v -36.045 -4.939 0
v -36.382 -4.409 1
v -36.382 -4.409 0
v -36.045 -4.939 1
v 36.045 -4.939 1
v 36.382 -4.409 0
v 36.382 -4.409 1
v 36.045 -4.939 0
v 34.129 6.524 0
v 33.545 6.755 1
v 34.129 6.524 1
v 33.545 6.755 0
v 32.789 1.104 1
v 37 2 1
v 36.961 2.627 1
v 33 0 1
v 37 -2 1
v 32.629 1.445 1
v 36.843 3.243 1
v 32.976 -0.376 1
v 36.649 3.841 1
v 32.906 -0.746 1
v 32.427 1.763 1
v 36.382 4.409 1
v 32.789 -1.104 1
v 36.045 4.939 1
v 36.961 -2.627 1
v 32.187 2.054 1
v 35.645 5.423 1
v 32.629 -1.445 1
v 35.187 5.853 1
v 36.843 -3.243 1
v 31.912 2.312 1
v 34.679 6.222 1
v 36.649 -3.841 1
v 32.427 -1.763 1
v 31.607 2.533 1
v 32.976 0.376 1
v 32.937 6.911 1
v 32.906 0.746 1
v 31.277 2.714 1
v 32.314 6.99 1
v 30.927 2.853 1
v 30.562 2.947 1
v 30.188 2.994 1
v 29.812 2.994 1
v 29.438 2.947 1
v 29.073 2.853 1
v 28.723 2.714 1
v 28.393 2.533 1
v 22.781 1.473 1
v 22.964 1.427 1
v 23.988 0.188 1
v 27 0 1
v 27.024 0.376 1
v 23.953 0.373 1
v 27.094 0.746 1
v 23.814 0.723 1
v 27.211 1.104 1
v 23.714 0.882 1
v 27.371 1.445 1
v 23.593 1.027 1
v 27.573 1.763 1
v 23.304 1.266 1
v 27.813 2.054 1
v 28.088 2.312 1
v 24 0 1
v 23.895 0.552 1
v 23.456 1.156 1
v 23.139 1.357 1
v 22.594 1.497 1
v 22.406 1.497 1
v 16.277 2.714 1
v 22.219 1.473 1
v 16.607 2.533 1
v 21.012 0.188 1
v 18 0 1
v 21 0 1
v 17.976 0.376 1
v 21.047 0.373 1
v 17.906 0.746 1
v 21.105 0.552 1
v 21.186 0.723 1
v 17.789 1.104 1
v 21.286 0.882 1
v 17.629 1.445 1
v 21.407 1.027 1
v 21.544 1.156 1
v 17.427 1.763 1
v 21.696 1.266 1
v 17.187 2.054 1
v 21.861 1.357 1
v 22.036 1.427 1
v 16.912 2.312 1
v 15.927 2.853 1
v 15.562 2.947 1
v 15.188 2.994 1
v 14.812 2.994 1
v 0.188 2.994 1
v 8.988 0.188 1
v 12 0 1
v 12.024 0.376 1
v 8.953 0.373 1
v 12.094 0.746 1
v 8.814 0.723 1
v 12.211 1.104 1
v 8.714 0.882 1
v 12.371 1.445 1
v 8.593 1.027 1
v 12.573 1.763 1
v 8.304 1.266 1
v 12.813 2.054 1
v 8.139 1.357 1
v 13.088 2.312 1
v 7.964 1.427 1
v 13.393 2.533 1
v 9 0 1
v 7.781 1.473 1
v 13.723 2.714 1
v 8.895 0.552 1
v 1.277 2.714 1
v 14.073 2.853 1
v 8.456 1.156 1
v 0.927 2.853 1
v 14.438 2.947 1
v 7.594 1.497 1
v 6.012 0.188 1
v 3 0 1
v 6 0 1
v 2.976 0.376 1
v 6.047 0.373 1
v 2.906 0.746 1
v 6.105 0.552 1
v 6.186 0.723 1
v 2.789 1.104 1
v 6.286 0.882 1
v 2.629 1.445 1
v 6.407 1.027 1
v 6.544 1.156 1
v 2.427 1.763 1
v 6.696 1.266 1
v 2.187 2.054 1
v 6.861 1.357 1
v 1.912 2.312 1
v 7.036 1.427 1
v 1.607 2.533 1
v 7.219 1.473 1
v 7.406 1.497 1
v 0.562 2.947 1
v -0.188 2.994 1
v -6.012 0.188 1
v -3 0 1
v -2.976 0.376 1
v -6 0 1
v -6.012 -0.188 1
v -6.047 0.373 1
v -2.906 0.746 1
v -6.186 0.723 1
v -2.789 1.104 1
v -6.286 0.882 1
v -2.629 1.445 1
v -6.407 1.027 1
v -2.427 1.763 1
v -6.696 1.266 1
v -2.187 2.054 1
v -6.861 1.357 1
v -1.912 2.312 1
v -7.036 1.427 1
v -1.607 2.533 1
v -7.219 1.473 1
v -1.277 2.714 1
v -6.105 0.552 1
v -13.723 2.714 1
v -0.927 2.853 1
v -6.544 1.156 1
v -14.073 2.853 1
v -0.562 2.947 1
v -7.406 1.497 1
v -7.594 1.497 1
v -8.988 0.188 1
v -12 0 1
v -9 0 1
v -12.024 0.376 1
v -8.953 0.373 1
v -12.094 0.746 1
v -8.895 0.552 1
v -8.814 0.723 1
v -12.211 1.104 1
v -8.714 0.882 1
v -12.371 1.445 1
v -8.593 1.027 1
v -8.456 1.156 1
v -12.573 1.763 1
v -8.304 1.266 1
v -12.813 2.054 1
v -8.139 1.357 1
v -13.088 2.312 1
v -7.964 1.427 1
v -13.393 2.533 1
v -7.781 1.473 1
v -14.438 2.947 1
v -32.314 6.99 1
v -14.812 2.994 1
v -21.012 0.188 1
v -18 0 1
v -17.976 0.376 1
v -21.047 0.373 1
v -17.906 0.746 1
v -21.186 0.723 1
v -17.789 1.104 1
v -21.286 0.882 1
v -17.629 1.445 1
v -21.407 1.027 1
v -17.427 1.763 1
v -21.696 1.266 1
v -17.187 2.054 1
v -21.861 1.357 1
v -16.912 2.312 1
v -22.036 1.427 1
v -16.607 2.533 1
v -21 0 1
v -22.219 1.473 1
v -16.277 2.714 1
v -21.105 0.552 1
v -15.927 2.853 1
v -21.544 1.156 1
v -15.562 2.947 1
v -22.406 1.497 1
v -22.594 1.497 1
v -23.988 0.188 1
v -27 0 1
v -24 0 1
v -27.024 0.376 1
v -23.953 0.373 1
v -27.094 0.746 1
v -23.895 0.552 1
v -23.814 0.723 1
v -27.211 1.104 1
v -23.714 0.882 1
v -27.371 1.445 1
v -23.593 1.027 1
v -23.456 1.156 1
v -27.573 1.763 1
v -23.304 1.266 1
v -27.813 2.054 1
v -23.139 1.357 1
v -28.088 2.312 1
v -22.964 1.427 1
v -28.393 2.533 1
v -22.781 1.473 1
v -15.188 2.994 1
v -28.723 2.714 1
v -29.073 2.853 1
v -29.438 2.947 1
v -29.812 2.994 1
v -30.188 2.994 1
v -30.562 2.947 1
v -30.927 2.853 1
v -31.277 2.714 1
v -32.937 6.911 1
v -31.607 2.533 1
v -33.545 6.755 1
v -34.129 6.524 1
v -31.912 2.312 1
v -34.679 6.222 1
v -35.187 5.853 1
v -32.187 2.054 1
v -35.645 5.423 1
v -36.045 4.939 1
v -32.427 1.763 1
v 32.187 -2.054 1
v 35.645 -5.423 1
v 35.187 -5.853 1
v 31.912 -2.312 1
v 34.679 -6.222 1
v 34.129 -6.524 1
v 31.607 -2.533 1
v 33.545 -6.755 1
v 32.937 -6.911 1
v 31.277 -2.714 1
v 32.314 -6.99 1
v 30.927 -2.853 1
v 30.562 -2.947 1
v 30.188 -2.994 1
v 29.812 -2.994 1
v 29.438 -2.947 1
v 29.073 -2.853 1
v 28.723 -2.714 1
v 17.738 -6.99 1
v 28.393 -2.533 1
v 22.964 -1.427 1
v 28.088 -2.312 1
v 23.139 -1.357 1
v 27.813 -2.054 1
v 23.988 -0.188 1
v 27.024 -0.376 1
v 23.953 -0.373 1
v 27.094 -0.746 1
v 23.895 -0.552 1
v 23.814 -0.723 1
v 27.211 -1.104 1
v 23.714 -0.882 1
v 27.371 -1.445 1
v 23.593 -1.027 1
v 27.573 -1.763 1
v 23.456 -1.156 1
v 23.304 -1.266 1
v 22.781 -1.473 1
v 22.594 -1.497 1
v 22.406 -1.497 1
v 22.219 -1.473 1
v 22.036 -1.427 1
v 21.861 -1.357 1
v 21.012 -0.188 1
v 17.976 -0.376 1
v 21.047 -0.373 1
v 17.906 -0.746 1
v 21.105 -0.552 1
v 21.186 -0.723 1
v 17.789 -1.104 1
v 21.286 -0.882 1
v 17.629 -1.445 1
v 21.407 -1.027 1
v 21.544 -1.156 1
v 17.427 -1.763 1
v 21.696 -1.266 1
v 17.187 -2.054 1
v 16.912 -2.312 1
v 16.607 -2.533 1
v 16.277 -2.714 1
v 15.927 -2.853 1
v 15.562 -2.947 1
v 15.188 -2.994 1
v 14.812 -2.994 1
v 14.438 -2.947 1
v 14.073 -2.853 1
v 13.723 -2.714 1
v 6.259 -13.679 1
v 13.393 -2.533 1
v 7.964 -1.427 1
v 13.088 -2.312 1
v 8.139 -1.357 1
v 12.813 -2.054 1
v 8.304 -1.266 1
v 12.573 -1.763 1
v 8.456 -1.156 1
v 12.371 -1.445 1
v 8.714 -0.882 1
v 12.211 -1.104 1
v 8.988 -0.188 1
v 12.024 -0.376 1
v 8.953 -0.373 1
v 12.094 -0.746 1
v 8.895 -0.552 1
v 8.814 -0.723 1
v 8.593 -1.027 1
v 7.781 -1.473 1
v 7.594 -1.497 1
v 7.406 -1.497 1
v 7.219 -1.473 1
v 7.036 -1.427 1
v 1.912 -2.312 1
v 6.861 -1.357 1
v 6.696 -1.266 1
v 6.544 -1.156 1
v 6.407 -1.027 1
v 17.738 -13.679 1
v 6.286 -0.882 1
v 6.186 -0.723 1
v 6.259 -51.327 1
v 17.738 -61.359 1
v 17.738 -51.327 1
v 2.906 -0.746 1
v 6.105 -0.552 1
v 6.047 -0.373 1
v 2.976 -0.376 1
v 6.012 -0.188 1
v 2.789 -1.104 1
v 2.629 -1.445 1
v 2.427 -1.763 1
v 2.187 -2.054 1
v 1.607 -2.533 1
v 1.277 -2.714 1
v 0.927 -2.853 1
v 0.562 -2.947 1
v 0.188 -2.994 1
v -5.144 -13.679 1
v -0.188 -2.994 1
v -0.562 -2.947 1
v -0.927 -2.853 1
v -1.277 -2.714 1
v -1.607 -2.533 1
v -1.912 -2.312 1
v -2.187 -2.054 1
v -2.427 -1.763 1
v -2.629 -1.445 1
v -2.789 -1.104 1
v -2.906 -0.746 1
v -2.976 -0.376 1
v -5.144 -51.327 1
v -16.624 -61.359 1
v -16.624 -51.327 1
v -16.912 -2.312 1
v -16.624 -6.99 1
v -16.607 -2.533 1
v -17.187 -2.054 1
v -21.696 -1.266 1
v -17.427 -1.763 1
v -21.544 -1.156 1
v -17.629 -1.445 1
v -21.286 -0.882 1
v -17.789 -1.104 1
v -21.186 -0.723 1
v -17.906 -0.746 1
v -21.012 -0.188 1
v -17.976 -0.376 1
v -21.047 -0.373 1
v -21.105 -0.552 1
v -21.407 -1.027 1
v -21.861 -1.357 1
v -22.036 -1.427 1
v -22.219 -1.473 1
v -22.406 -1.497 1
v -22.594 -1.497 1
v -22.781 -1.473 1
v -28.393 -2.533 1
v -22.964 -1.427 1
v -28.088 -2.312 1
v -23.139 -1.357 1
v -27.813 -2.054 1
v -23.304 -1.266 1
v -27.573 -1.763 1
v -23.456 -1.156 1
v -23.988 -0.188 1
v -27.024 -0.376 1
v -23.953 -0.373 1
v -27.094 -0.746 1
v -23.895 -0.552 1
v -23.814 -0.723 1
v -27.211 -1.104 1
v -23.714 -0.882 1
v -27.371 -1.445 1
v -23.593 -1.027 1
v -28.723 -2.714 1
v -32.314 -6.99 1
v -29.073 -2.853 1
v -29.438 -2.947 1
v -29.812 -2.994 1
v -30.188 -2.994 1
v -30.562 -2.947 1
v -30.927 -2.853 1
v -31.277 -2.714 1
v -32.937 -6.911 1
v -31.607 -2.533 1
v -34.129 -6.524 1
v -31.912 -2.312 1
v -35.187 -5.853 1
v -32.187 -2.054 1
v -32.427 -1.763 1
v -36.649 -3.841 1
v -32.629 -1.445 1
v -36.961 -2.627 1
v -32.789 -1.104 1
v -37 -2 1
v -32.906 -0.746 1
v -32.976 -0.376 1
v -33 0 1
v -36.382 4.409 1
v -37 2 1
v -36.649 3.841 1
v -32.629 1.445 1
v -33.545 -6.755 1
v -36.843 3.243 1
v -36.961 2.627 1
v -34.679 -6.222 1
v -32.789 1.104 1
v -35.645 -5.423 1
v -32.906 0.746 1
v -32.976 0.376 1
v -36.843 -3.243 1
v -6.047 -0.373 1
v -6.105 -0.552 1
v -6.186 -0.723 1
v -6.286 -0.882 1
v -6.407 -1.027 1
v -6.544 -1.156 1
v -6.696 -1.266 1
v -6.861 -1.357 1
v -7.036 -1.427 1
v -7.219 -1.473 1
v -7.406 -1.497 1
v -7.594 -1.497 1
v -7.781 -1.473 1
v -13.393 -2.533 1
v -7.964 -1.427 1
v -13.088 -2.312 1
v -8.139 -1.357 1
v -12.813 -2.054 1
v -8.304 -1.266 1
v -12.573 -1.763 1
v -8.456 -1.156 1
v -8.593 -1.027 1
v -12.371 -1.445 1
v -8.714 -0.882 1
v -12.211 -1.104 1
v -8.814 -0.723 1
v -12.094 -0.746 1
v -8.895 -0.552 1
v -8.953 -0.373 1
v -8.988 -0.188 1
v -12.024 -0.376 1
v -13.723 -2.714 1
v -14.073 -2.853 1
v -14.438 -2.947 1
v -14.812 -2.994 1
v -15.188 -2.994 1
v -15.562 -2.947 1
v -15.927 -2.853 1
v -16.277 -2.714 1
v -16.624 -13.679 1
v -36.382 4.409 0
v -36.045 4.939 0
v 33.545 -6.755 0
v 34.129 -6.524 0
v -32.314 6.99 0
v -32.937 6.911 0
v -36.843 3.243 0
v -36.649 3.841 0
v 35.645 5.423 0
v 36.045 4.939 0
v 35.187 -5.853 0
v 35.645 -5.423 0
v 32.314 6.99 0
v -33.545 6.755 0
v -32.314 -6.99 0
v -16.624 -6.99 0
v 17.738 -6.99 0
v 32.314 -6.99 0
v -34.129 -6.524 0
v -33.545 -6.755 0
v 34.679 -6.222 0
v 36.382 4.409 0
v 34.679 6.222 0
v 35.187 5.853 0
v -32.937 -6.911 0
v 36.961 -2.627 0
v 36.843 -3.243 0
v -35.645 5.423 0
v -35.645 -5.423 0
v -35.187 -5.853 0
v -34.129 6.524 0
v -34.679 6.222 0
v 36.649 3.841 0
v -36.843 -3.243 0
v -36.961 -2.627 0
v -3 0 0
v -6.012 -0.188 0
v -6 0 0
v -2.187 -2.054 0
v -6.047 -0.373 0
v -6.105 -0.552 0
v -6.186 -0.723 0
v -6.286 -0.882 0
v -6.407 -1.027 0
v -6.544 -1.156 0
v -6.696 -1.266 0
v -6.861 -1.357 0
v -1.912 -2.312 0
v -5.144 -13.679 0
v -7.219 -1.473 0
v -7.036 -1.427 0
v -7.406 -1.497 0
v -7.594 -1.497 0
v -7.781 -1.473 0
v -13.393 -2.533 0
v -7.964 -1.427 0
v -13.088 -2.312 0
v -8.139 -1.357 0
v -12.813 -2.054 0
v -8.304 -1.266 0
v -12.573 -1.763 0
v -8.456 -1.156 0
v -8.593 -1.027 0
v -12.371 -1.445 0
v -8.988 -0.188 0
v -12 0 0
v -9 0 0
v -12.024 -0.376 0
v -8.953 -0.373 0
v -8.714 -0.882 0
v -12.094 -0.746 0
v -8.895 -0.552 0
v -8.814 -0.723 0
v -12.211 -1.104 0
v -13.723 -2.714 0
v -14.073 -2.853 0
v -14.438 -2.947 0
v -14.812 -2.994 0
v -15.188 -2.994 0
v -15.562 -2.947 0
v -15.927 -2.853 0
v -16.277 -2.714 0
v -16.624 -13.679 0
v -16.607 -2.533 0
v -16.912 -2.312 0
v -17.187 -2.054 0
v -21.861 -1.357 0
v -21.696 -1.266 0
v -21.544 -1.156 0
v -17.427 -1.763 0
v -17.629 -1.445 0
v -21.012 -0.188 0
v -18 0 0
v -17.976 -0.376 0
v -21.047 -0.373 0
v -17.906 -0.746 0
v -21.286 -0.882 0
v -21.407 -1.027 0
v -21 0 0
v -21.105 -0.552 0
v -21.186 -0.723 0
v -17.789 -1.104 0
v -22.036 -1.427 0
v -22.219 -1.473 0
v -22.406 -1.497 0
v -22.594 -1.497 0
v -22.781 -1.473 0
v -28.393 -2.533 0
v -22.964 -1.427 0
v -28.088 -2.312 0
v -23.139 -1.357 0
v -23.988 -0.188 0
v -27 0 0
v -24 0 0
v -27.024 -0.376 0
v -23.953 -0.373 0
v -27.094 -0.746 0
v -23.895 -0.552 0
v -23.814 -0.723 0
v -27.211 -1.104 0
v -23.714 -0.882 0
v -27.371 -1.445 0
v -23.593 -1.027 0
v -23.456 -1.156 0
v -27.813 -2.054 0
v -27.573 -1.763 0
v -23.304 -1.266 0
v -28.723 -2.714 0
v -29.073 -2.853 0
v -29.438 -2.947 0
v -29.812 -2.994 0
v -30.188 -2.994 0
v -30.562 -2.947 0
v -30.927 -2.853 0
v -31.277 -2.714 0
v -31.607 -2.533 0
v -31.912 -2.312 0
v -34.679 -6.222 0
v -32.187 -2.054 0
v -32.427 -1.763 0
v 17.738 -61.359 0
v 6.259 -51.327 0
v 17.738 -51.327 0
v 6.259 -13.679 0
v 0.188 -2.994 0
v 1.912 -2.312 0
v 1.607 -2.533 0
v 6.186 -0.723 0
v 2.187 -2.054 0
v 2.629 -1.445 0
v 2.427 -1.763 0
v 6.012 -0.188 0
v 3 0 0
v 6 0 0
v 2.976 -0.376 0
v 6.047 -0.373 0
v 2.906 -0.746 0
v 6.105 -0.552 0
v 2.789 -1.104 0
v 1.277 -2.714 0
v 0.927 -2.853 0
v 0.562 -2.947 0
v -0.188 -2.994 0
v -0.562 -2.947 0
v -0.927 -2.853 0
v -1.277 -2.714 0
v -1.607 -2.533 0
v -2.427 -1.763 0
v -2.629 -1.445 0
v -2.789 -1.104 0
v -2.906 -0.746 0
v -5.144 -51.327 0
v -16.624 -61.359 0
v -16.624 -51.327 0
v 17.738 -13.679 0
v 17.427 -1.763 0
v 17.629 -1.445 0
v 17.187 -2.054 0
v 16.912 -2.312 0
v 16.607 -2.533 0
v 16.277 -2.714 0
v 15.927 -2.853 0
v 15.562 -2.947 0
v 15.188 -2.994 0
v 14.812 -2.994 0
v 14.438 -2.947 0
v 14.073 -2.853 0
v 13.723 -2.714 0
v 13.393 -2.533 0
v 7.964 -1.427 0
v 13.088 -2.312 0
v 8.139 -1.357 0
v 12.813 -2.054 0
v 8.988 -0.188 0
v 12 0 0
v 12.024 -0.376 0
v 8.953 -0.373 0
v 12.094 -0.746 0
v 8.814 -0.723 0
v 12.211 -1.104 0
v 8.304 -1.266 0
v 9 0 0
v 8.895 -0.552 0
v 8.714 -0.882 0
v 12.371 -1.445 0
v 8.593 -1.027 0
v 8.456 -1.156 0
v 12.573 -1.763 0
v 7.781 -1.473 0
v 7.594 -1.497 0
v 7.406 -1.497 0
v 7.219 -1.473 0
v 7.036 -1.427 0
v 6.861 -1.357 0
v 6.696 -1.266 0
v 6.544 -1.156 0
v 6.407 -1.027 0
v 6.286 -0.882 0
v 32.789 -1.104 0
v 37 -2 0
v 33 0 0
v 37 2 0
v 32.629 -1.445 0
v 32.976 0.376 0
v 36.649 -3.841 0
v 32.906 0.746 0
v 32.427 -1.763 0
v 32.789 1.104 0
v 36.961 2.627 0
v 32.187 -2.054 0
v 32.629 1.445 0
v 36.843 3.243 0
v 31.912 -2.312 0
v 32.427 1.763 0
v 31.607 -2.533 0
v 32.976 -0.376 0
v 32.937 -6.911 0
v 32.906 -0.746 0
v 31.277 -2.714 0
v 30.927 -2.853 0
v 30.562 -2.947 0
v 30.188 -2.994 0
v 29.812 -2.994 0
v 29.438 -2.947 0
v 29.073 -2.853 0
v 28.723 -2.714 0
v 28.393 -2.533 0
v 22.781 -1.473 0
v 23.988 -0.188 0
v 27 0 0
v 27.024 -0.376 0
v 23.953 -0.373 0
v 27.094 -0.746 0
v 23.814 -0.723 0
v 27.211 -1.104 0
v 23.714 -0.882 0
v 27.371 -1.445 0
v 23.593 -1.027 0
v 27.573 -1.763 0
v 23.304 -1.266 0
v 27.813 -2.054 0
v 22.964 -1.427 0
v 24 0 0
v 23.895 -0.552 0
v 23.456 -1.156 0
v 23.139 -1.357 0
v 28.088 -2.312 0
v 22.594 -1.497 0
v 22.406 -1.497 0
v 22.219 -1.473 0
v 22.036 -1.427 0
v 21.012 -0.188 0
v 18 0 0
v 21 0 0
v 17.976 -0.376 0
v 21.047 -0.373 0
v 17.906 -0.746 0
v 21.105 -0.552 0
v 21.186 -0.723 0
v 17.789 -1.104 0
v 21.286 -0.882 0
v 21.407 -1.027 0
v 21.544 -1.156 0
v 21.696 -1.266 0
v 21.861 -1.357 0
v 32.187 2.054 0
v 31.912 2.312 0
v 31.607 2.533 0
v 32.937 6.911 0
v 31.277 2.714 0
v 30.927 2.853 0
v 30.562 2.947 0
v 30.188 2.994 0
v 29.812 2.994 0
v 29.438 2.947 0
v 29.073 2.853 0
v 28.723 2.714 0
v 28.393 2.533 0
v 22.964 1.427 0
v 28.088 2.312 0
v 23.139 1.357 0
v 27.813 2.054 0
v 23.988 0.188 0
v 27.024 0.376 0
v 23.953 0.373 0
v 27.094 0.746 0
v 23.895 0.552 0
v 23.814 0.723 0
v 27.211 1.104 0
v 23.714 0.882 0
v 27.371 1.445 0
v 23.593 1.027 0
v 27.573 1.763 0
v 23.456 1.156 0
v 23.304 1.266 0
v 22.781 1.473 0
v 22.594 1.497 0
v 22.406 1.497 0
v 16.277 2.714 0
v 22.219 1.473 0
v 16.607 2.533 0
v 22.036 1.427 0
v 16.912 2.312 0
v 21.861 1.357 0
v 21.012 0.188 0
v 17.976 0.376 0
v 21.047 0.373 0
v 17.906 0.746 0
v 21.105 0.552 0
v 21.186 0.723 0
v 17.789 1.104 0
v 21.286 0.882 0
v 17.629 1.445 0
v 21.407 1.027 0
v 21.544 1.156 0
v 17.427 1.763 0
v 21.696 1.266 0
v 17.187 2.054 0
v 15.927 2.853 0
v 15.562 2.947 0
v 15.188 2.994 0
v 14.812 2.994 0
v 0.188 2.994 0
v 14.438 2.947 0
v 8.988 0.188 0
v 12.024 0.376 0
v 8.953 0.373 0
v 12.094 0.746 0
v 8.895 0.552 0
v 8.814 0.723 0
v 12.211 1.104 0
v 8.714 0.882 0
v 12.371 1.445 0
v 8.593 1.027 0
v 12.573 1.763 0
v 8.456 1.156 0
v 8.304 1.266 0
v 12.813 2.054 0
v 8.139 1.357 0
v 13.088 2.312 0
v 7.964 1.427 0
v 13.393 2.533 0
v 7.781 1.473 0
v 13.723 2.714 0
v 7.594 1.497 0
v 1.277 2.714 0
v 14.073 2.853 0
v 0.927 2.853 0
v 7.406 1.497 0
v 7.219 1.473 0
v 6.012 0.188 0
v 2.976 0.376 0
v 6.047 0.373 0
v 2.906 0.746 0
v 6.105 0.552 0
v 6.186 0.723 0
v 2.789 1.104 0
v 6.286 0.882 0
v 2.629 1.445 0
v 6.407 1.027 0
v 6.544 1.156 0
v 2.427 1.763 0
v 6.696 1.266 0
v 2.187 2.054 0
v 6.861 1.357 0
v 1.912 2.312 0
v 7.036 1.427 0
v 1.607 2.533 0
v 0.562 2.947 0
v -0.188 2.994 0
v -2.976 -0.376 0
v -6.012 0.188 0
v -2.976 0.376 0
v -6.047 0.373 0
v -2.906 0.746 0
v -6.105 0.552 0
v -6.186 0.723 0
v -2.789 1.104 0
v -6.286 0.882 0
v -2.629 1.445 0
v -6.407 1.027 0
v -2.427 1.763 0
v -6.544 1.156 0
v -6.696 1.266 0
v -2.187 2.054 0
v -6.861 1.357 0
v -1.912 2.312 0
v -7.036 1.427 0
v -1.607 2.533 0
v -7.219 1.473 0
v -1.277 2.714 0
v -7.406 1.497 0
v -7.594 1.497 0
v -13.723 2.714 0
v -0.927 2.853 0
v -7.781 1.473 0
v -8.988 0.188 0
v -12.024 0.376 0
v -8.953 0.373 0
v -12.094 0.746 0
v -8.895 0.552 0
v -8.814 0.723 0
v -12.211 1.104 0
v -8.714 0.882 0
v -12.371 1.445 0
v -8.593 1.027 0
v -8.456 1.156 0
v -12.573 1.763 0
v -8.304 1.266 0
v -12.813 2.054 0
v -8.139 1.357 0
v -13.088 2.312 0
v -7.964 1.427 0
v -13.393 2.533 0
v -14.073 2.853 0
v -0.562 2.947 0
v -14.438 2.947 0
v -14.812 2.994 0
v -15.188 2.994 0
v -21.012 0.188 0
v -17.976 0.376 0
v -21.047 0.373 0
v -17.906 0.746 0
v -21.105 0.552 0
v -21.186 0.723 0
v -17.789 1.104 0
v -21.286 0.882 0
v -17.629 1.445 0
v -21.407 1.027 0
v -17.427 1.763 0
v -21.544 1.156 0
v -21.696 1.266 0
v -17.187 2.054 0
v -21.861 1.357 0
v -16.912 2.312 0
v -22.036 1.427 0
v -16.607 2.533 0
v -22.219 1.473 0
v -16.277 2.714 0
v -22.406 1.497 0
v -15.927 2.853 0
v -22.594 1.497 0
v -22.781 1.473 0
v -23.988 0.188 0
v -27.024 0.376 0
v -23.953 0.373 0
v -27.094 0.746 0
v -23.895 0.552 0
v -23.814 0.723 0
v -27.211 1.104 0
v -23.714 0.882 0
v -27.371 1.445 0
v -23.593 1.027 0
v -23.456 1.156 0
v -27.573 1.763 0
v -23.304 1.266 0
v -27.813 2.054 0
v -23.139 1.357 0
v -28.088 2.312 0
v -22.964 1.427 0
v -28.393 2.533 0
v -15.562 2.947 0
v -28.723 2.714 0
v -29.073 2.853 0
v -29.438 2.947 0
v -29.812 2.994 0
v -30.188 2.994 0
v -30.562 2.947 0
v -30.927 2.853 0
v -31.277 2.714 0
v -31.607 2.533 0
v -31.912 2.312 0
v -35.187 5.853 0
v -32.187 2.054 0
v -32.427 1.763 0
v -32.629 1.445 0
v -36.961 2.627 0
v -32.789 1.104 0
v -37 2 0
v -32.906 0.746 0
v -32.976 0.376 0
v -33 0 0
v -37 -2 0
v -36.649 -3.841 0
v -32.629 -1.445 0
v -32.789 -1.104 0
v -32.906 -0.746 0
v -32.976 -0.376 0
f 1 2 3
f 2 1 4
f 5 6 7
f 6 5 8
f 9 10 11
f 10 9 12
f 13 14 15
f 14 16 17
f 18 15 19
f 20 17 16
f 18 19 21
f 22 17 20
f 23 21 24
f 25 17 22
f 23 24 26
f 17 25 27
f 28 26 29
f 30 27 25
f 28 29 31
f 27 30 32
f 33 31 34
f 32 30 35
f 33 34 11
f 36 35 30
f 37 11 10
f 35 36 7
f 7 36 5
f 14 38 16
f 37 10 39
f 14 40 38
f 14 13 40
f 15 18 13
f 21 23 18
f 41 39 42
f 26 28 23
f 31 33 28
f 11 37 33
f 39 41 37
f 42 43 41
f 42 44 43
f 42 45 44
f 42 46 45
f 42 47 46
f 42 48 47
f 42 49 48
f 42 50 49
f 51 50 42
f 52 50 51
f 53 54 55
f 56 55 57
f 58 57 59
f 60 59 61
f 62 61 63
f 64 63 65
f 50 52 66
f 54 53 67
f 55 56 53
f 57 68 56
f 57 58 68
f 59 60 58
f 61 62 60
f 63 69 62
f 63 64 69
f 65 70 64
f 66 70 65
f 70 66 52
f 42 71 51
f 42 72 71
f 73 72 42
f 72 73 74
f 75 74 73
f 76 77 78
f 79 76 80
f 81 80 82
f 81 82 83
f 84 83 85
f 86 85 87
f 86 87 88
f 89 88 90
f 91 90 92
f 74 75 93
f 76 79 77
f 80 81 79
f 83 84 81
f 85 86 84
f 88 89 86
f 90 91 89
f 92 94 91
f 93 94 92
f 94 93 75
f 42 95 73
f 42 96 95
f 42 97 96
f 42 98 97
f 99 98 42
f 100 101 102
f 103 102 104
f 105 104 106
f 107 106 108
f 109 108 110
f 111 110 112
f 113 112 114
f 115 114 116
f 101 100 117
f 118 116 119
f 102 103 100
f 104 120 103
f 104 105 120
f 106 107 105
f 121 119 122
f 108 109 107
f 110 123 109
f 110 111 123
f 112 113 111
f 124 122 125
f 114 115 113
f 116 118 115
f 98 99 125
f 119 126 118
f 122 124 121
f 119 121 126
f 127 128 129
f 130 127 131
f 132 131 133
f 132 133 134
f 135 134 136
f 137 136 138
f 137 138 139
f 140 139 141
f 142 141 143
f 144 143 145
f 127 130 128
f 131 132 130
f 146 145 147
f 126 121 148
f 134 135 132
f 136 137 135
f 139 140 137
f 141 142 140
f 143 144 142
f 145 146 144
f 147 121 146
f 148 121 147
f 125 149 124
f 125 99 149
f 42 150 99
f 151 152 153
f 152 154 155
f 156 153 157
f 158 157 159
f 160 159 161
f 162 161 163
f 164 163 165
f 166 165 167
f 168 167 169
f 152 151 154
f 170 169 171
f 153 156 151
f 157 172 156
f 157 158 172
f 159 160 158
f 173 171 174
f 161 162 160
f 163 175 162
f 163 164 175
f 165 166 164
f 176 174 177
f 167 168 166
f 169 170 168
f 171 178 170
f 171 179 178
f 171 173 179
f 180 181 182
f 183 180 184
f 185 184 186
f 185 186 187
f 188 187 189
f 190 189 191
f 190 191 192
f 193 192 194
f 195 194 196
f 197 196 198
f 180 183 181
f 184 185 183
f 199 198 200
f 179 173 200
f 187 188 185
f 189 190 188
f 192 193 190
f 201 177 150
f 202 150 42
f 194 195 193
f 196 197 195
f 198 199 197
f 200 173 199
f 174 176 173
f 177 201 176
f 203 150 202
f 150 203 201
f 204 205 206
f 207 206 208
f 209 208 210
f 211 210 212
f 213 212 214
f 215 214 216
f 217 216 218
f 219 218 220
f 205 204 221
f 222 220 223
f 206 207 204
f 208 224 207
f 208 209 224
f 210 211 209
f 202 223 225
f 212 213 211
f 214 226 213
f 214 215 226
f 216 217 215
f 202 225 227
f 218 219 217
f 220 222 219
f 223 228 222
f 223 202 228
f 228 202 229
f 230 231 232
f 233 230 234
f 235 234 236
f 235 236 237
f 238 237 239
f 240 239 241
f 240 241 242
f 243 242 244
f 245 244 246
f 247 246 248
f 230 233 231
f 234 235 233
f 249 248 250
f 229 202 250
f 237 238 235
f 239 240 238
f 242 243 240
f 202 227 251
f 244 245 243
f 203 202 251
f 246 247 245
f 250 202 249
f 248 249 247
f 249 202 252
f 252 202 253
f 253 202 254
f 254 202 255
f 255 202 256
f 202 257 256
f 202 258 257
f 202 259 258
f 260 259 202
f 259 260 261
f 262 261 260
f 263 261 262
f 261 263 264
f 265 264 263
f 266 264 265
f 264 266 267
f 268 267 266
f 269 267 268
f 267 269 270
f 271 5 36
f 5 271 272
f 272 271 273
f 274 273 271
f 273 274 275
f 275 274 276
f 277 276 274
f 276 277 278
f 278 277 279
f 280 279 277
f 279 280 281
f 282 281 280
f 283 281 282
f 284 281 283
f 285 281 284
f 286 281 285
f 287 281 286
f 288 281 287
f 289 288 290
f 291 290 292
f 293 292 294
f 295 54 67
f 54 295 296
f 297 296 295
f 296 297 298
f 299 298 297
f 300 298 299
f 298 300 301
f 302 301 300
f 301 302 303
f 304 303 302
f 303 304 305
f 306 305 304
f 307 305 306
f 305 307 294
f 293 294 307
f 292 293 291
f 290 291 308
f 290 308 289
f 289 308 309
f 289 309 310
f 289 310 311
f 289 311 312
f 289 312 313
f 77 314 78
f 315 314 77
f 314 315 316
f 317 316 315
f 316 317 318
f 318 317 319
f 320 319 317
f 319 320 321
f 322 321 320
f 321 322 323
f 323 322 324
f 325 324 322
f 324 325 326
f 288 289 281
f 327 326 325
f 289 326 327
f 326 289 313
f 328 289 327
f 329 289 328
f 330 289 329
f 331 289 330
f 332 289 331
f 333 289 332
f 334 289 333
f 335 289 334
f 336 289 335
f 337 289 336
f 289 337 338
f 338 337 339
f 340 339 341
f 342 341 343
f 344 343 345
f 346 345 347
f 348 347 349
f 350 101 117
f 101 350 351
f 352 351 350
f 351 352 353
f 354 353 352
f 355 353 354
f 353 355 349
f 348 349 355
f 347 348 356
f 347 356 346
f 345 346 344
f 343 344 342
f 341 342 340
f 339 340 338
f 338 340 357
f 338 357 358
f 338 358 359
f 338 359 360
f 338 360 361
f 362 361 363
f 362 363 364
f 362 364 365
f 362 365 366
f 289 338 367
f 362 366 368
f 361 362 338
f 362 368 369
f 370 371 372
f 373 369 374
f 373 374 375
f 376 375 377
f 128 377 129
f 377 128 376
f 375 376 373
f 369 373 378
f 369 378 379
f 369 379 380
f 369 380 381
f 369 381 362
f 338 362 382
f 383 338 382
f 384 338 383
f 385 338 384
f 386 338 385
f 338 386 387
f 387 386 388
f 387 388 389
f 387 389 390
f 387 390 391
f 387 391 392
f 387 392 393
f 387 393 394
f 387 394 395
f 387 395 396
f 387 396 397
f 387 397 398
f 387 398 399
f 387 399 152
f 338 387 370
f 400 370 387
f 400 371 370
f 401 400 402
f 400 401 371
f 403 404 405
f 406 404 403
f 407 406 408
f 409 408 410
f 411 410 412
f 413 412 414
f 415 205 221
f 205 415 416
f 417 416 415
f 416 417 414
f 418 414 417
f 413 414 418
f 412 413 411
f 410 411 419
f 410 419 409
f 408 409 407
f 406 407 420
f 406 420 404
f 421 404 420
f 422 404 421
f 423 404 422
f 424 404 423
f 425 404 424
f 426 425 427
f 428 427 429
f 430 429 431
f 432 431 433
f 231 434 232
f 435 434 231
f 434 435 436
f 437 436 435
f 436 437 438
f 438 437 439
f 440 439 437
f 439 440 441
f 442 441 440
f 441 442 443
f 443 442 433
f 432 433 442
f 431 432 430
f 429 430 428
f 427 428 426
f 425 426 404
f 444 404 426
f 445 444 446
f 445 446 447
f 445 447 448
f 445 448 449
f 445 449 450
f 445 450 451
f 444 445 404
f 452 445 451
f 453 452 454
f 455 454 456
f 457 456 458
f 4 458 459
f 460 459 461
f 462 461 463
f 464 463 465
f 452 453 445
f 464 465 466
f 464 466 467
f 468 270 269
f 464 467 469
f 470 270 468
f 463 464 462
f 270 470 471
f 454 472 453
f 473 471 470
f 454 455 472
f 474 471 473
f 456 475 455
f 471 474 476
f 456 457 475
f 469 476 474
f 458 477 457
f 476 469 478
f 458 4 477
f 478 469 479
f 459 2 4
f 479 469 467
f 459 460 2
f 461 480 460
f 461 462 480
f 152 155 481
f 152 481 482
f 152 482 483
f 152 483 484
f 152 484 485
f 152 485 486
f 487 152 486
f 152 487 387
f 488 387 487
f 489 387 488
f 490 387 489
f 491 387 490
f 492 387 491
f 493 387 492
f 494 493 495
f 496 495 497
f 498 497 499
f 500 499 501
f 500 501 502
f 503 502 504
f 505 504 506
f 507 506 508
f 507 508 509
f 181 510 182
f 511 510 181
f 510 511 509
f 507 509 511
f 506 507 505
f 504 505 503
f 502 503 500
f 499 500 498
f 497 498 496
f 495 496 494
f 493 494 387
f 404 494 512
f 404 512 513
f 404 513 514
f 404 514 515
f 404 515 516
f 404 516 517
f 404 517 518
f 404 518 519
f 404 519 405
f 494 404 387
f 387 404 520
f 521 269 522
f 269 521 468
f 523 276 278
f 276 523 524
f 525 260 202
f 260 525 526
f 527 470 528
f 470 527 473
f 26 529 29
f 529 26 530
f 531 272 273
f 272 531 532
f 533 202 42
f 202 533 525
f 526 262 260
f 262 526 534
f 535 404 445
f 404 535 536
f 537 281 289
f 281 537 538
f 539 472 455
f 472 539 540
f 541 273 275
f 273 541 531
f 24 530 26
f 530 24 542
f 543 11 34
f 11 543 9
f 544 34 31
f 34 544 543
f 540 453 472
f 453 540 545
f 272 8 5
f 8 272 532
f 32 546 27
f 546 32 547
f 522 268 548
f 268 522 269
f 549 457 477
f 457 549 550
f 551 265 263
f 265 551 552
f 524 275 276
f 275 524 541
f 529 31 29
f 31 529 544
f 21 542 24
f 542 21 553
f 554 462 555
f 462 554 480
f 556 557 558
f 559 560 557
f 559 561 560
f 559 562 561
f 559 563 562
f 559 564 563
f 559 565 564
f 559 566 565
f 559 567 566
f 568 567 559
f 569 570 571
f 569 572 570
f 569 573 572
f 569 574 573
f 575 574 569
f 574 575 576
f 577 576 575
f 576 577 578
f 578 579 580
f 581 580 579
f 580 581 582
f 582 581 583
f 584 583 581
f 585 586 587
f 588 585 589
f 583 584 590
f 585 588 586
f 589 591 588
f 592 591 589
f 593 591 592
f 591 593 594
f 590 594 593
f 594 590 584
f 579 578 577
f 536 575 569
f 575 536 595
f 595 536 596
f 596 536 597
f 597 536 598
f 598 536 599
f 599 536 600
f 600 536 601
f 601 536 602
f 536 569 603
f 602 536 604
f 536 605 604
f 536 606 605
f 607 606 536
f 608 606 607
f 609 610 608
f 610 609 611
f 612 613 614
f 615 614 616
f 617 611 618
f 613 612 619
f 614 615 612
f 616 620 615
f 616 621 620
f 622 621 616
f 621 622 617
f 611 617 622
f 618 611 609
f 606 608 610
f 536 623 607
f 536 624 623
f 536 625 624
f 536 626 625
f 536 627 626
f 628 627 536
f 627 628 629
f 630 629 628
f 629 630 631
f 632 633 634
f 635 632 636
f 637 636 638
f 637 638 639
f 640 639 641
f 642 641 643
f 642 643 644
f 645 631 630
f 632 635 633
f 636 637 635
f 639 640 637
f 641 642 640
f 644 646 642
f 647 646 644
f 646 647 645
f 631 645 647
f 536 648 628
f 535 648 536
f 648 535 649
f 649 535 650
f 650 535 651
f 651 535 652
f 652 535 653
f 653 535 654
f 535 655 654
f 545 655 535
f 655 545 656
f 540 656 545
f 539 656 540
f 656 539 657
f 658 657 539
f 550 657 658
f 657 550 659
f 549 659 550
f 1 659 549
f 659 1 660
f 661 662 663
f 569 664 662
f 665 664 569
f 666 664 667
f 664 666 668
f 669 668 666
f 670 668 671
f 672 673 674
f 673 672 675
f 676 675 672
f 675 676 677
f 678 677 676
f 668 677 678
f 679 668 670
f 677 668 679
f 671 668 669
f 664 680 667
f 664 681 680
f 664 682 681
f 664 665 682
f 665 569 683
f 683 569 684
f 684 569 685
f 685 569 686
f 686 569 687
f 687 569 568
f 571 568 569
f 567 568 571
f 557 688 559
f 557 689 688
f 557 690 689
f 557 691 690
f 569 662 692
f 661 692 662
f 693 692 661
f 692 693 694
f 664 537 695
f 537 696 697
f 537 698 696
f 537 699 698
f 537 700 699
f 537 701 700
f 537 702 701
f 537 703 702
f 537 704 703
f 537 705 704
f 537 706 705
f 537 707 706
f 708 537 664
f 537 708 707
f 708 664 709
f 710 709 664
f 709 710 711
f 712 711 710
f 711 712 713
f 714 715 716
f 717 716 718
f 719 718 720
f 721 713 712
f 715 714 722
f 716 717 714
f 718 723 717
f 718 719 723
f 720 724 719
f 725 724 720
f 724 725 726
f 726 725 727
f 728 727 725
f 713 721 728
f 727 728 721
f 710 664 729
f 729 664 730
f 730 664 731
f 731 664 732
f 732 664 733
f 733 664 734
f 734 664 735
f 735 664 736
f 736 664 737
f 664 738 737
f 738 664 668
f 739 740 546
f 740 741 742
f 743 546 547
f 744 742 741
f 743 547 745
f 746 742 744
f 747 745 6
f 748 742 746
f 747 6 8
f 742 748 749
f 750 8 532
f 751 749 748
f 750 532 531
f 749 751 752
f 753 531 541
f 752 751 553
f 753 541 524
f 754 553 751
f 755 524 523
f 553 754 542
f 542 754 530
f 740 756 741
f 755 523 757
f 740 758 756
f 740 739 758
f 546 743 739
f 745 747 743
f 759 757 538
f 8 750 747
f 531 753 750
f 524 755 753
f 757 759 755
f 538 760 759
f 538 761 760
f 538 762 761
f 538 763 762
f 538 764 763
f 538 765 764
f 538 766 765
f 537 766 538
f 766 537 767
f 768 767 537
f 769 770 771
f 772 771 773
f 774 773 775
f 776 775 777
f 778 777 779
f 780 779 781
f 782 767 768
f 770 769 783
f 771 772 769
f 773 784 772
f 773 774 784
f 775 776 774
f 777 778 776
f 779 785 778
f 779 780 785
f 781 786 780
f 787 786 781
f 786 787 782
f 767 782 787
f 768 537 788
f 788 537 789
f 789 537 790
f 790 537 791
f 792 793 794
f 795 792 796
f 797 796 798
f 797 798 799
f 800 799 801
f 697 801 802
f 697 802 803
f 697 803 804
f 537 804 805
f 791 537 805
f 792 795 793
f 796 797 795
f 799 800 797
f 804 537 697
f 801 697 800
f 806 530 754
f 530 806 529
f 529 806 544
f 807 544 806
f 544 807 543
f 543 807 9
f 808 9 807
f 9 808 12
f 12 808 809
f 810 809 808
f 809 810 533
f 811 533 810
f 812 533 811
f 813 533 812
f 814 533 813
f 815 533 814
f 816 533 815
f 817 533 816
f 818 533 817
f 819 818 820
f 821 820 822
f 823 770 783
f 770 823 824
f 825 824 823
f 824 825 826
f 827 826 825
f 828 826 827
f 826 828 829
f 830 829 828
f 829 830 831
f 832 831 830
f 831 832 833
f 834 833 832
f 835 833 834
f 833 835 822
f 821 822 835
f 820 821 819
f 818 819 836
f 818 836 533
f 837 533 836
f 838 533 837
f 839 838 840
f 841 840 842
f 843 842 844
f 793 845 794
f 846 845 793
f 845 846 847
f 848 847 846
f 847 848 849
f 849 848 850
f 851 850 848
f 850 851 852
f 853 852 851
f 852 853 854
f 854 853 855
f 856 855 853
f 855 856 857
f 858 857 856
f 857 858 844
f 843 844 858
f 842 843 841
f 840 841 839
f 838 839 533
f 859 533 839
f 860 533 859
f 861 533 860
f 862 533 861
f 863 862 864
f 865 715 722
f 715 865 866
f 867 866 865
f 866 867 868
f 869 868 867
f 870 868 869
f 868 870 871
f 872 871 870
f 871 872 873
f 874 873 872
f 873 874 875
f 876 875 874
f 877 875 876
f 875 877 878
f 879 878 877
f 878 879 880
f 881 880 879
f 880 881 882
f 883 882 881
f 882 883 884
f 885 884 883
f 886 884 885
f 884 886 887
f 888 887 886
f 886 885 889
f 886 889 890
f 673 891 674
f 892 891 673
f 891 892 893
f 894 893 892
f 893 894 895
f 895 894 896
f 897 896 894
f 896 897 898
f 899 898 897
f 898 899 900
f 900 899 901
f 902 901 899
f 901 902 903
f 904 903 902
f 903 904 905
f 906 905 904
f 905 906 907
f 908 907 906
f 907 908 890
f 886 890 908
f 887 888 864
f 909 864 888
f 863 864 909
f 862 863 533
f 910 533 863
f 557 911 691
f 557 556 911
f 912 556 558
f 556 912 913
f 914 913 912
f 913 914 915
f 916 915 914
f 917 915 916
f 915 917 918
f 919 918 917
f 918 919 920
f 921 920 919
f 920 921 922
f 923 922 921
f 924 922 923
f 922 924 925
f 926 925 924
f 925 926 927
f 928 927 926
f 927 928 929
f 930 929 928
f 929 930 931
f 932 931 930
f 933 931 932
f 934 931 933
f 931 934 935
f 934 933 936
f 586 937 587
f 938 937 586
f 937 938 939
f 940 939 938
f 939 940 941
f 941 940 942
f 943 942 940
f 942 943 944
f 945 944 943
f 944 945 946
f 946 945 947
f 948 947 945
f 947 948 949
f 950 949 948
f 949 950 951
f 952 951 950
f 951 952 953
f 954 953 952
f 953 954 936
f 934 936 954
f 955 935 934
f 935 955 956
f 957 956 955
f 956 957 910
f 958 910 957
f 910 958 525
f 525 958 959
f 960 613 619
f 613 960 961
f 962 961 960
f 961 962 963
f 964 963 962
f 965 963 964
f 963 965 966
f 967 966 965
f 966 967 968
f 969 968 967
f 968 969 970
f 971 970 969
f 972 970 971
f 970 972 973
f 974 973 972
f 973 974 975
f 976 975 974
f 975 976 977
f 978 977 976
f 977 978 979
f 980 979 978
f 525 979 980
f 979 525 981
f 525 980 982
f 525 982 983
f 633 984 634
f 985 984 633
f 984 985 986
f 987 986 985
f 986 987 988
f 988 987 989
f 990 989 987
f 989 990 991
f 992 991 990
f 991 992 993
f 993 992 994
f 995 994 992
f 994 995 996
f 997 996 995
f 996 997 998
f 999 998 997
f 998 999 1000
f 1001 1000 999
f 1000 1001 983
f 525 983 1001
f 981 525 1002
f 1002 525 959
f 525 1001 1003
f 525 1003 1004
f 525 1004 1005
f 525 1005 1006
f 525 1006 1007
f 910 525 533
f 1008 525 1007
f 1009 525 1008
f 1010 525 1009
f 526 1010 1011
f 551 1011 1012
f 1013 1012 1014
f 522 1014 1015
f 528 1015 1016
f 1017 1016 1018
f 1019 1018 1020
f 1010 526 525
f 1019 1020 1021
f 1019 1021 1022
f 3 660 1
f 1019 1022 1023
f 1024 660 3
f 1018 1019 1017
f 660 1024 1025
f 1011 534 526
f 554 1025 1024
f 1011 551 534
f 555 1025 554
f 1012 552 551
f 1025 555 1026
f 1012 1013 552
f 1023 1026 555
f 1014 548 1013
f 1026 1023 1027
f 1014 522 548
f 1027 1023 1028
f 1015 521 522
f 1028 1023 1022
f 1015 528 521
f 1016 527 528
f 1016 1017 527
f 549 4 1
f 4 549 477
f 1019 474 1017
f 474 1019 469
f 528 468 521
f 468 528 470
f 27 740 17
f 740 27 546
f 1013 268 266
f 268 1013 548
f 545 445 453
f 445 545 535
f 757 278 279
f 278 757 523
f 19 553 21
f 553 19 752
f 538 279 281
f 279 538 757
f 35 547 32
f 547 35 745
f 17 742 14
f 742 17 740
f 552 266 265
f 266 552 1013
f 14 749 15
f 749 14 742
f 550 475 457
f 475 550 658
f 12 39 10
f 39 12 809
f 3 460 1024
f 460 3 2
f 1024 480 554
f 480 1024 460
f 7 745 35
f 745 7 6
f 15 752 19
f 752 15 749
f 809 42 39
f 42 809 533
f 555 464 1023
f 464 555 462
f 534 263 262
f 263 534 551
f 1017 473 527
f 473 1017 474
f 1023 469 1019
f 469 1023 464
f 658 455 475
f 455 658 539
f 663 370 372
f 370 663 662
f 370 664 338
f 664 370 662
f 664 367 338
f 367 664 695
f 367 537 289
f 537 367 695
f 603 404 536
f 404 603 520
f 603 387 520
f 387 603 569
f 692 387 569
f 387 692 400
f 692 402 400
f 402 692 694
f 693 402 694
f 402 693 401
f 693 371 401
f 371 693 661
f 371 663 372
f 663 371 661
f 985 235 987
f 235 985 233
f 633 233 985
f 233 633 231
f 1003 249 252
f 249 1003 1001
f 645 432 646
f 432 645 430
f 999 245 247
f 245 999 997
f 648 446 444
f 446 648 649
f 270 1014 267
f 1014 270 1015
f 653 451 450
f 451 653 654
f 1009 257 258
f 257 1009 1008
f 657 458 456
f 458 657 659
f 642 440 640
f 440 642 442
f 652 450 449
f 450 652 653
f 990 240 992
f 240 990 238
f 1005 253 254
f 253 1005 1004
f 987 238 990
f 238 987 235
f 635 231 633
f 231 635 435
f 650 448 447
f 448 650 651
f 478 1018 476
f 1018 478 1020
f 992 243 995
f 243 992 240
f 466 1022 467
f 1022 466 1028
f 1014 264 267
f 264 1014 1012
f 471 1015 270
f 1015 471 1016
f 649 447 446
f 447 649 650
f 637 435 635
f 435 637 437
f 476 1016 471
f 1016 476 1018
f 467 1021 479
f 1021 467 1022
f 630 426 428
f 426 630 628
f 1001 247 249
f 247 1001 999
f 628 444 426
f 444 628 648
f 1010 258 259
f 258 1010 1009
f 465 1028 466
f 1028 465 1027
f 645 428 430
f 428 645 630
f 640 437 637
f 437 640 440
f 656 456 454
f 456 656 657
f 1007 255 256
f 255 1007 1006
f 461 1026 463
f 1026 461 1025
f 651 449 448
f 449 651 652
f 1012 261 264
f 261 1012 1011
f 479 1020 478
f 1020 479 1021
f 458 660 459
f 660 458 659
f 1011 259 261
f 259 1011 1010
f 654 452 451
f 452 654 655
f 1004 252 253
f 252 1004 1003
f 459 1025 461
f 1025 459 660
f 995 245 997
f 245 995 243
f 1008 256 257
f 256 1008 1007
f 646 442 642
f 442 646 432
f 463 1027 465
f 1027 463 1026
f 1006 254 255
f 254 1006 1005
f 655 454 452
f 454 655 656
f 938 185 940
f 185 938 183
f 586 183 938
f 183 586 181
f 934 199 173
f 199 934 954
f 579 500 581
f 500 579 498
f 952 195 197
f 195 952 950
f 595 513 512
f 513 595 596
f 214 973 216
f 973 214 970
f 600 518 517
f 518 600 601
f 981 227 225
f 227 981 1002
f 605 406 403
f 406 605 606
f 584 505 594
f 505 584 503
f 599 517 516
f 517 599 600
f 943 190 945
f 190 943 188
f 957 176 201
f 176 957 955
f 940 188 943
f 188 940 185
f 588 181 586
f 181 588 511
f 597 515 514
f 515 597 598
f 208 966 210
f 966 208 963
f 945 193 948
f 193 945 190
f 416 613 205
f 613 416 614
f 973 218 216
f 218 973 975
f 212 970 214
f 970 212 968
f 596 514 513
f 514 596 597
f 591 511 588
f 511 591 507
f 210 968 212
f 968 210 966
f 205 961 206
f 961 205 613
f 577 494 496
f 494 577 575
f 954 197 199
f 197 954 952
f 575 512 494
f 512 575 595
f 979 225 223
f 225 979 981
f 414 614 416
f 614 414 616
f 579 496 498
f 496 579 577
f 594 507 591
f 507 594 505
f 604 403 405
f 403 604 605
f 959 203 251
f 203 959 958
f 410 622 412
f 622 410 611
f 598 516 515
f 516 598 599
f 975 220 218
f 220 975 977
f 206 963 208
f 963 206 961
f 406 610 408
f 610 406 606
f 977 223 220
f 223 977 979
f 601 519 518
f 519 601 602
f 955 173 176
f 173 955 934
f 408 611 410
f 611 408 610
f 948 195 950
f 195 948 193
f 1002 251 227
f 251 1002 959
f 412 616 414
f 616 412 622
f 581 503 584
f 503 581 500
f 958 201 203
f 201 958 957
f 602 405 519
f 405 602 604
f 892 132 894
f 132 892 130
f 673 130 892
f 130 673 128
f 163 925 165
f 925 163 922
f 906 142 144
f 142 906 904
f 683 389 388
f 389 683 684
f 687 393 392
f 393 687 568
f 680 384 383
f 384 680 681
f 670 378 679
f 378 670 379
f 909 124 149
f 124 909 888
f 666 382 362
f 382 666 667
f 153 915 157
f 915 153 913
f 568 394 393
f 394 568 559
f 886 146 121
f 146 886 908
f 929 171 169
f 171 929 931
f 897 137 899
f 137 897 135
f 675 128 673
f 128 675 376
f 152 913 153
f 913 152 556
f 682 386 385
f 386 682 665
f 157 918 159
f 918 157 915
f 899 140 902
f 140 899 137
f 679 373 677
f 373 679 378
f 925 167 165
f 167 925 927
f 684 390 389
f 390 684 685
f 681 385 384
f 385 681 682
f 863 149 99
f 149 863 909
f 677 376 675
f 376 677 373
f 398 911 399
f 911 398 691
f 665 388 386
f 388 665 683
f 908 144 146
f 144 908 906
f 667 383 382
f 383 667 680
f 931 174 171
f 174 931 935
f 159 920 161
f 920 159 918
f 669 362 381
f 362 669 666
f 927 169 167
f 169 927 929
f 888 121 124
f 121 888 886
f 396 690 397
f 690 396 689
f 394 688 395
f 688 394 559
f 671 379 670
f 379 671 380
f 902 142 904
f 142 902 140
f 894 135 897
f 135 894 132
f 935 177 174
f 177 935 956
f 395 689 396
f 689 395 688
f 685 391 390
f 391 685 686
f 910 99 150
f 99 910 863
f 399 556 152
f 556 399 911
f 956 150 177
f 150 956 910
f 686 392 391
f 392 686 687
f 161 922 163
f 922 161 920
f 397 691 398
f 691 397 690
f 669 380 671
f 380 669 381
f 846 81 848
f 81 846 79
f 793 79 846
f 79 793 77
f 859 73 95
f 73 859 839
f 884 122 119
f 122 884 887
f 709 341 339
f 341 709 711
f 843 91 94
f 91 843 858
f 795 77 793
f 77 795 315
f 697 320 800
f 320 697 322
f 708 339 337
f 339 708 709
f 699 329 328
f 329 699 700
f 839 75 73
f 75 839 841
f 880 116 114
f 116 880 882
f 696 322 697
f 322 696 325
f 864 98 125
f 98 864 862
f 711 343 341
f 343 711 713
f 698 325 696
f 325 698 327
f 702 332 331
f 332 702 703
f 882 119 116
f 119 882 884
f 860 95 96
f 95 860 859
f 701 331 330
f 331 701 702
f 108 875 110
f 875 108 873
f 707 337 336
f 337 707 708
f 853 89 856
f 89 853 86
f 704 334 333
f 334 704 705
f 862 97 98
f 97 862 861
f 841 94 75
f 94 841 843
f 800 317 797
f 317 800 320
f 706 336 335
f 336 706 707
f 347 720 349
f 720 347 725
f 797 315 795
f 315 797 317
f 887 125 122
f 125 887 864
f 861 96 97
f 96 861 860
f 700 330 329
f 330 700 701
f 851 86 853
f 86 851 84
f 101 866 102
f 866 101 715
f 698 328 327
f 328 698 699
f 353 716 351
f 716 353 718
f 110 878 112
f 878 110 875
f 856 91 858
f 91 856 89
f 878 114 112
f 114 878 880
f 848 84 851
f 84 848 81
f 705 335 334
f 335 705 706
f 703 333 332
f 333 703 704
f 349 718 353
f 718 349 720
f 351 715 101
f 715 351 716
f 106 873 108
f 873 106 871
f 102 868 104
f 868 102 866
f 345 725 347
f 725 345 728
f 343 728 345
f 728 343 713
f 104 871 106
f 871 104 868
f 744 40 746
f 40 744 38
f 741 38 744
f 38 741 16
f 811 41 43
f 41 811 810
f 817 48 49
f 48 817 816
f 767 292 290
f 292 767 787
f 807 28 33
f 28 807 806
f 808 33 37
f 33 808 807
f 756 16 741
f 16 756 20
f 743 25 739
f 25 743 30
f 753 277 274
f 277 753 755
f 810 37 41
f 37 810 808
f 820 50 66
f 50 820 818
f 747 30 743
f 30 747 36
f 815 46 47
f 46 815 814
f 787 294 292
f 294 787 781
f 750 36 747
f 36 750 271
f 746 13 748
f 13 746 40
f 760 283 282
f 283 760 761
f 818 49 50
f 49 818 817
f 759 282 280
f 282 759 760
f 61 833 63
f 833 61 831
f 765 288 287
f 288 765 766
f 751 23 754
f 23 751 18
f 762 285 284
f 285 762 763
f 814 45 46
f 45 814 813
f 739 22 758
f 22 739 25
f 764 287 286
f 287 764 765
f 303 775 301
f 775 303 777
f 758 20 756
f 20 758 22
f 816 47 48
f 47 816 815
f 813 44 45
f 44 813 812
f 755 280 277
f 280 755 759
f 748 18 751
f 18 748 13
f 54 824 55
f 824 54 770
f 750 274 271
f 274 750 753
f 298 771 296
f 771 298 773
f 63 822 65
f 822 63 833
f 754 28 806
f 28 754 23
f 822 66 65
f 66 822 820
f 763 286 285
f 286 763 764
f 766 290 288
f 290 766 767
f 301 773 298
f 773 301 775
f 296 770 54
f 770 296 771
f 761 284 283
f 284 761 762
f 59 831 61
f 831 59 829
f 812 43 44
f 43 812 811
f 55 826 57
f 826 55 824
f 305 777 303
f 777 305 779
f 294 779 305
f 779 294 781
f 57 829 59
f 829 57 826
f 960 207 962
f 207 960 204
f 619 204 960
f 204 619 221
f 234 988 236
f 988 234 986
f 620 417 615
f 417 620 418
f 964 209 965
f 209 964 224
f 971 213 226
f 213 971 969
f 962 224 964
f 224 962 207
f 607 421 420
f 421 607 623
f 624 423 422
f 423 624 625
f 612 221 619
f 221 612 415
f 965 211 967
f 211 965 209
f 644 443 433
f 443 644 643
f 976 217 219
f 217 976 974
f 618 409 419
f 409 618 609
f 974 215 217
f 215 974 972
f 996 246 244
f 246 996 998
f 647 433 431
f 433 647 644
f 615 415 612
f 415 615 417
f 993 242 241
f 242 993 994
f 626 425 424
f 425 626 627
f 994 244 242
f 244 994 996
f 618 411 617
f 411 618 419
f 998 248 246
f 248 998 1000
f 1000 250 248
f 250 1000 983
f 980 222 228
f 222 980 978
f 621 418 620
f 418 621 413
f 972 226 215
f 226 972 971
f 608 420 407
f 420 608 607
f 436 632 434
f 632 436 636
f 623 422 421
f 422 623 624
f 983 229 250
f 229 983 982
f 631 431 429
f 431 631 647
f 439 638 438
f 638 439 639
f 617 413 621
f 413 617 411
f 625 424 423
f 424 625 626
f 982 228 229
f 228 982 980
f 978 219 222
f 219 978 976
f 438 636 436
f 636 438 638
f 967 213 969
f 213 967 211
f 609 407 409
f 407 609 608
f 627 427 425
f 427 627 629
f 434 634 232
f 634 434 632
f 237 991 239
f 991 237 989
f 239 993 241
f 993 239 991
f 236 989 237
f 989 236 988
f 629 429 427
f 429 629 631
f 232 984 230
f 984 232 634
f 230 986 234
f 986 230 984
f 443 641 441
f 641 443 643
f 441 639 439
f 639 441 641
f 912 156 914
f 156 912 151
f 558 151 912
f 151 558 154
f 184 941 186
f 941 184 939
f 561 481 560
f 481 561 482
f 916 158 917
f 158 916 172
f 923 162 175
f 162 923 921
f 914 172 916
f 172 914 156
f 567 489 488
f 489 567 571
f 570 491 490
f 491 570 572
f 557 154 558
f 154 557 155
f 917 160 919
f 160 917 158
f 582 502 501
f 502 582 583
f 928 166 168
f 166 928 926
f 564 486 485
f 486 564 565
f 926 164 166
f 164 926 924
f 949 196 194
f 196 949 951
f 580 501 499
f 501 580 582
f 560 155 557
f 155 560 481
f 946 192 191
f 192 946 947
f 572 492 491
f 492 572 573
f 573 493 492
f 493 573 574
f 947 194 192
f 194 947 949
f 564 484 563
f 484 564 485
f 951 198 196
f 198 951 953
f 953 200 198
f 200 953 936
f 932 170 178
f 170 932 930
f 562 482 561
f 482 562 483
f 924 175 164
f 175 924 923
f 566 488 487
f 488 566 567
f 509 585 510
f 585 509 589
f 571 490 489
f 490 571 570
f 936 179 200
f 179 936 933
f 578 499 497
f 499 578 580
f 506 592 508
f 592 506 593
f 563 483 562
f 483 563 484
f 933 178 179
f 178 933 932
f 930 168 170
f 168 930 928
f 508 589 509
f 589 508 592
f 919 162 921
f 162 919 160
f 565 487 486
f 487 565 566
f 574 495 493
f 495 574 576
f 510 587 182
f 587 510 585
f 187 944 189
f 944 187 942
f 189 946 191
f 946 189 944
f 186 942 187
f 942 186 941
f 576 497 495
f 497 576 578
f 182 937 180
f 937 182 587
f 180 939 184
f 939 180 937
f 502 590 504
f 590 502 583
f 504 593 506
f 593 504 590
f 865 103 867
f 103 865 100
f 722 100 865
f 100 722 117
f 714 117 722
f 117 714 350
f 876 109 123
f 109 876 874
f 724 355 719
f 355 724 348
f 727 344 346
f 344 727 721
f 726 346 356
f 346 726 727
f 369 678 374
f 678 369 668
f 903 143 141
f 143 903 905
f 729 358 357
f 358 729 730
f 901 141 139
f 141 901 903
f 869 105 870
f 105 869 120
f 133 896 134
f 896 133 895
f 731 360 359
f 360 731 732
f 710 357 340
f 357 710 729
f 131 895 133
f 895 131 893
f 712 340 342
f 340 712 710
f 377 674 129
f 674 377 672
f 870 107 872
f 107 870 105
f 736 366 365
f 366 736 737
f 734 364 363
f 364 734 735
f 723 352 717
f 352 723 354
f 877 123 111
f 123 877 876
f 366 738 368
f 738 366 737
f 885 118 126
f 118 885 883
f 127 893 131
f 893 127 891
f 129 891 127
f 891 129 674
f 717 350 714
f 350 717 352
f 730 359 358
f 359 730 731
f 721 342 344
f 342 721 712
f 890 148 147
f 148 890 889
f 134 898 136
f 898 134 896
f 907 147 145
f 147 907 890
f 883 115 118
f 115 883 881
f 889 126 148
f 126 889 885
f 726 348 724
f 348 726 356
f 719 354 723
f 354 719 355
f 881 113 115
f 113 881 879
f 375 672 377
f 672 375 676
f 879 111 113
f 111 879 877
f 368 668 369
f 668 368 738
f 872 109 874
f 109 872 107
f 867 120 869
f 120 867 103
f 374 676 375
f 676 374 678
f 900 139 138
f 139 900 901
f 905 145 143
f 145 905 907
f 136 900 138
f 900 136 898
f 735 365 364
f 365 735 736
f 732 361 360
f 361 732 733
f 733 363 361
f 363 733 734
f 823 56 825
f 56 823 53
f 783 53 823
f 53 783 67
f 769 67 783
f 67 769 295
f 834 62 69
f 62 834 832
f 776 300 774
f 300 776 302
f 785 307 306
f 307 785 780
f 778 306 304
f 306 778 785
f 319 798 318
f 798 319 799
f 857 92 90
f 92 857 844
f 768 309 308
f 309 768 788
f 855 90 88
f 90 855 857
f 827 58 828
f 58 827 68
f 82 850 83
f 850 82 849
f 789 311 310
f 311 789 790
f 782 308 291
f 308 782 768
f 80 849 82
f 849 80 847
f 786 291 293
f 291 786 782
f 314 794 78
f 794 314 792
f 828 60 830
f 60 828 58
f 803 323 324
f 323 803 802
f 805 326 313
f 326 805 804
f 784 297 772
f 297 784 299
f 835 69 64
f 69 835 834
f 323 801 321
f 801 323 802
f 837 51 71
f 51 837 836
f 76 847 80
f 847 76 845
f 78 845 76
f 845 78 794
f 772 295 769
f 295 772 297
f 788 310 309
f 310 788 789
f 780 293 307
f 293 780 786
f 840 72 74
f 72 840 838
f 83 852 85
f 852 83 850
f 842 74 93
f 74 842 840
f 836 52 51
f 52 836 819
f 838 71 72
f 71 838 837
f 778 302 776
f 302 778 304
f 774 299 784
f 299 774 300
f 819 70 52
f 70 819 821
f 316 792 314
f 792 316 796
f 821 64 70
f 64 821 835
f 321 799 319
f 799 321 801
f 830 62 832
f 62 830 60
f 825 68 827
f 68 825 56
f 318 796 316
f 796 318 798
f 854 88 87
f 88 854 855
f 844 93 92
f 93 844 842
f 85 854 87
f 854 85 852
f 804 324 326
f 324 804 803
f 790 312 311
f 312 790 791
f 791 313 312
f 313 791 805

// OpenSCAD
$fn = 50;


difference() {
	union() {
		hull() {
			translate(v = [-32.0000000000, 2.0000000000, 0]) {
				cylinder(h = 1, r = 5);
			}
			translate(v = [32.0000000000, 2.0000000000, 0]) {
				cylinder(h = 1, r = 5);
			}
			translate(v = [-32.0000000000, -2.0000000000, 0]) {
				cylinder(h = 1, r = 5);
			}
			translate(v = [32.0000000000, -2.0000000000, 0]) {
				cylinder(h = 1, r = 5);
			}
		}
		translate(v = [0, -5, 0]) {
			linear_extrude(height = 1) {
				text(font = "DejaVu Sans Mono:style=Bold", halign = "center", size = 57.0000000000, text = "I", valign = "top");
			}
		}
	}
	union() {
		translate(v = [-30.0000000000, 0.0000000000, 0]) {
			translate(v = [0, 0, -100]) {
				cylinder(h = 200, r = 3.0000000000);
			}
		}
		translate(v = [-15.0000000000, 0.0000000000, 0]) {
			translate(v = [0, 0, -100]) {
				cylinder(h = 200, r = 3.0000000000);
			}
		}
		translate(v = [0, 0, -100]) {
			cylinder(h = 200, r = 3.0000000000);
		}
		translate(v = [15.0000000000, 0.0000000000, 0]) {
			translate(v = [0, 0, -100]) {
				cylinder(h = 200, r = 3.0000000000);
			}
		}
		translate(v = [30.0000000000, 0.0000000000, 0]) {
			translate(v = [0, 0, -100]) {
				cylinder(h = 200, r = 3.0000000000);
			}
		}
		translate(v = [-30.0000000000, 0.0000000000, 0]) {
			translate(v = [0, 0, -100]) {
				cylinder(h = 200, r = 1.5000000000);
			}
		}
		translate(v = [-22.5000000000, 0.0000000000, 0]) {
			translate(v = [0, 0, -100]) {
				cylinder(h = 200, r = 1.5000000000);
			}
		}
		translate(v = [-15.0000000000, 0.0000000000, 0]) {
			translate(v = [0, 0, -100]) {
				cylinder(h = 200, r = 1.5000000000);
			}
		}
		translate(v = [-7.5000000000, 0.0000000000, 0]) {
			translate(v = [0, 0, -100]) {
				cylinder(h = 200, r = 1.5000000000);
			}
		}
		translate(v = [0, 0, -100]) {
			cylinder(h = 200, r = 1.5000000000);
		}
		translate(v = [7.5000000000, 0.0000000000, 0]) {
			translate(v = [0, 0, -100]) {
				cylinder(h = 200, r = 1.5000000000);
			}
		}
		translate(v = [15.0000000000, 0.0000000000, 0]) {
			translate(v = [0, 0, -100]) {
				cylinder(h = 200, r = 1.5000000000);
			}
		}
		translate(v = [22.5000000000, 0.0000000000, 0]) {
			translate(v = [0, 0, -100]) {
				cylinder(h = 200, r = 1.5000000000);
			}
		}
		translate(v = [30.0000000000, 0.0000000000, 0]) {
			translate(v = [0, 0, -100]) {
				cylinder(h = 200, r = 1.5000000000);
			}
		}
	}
}
